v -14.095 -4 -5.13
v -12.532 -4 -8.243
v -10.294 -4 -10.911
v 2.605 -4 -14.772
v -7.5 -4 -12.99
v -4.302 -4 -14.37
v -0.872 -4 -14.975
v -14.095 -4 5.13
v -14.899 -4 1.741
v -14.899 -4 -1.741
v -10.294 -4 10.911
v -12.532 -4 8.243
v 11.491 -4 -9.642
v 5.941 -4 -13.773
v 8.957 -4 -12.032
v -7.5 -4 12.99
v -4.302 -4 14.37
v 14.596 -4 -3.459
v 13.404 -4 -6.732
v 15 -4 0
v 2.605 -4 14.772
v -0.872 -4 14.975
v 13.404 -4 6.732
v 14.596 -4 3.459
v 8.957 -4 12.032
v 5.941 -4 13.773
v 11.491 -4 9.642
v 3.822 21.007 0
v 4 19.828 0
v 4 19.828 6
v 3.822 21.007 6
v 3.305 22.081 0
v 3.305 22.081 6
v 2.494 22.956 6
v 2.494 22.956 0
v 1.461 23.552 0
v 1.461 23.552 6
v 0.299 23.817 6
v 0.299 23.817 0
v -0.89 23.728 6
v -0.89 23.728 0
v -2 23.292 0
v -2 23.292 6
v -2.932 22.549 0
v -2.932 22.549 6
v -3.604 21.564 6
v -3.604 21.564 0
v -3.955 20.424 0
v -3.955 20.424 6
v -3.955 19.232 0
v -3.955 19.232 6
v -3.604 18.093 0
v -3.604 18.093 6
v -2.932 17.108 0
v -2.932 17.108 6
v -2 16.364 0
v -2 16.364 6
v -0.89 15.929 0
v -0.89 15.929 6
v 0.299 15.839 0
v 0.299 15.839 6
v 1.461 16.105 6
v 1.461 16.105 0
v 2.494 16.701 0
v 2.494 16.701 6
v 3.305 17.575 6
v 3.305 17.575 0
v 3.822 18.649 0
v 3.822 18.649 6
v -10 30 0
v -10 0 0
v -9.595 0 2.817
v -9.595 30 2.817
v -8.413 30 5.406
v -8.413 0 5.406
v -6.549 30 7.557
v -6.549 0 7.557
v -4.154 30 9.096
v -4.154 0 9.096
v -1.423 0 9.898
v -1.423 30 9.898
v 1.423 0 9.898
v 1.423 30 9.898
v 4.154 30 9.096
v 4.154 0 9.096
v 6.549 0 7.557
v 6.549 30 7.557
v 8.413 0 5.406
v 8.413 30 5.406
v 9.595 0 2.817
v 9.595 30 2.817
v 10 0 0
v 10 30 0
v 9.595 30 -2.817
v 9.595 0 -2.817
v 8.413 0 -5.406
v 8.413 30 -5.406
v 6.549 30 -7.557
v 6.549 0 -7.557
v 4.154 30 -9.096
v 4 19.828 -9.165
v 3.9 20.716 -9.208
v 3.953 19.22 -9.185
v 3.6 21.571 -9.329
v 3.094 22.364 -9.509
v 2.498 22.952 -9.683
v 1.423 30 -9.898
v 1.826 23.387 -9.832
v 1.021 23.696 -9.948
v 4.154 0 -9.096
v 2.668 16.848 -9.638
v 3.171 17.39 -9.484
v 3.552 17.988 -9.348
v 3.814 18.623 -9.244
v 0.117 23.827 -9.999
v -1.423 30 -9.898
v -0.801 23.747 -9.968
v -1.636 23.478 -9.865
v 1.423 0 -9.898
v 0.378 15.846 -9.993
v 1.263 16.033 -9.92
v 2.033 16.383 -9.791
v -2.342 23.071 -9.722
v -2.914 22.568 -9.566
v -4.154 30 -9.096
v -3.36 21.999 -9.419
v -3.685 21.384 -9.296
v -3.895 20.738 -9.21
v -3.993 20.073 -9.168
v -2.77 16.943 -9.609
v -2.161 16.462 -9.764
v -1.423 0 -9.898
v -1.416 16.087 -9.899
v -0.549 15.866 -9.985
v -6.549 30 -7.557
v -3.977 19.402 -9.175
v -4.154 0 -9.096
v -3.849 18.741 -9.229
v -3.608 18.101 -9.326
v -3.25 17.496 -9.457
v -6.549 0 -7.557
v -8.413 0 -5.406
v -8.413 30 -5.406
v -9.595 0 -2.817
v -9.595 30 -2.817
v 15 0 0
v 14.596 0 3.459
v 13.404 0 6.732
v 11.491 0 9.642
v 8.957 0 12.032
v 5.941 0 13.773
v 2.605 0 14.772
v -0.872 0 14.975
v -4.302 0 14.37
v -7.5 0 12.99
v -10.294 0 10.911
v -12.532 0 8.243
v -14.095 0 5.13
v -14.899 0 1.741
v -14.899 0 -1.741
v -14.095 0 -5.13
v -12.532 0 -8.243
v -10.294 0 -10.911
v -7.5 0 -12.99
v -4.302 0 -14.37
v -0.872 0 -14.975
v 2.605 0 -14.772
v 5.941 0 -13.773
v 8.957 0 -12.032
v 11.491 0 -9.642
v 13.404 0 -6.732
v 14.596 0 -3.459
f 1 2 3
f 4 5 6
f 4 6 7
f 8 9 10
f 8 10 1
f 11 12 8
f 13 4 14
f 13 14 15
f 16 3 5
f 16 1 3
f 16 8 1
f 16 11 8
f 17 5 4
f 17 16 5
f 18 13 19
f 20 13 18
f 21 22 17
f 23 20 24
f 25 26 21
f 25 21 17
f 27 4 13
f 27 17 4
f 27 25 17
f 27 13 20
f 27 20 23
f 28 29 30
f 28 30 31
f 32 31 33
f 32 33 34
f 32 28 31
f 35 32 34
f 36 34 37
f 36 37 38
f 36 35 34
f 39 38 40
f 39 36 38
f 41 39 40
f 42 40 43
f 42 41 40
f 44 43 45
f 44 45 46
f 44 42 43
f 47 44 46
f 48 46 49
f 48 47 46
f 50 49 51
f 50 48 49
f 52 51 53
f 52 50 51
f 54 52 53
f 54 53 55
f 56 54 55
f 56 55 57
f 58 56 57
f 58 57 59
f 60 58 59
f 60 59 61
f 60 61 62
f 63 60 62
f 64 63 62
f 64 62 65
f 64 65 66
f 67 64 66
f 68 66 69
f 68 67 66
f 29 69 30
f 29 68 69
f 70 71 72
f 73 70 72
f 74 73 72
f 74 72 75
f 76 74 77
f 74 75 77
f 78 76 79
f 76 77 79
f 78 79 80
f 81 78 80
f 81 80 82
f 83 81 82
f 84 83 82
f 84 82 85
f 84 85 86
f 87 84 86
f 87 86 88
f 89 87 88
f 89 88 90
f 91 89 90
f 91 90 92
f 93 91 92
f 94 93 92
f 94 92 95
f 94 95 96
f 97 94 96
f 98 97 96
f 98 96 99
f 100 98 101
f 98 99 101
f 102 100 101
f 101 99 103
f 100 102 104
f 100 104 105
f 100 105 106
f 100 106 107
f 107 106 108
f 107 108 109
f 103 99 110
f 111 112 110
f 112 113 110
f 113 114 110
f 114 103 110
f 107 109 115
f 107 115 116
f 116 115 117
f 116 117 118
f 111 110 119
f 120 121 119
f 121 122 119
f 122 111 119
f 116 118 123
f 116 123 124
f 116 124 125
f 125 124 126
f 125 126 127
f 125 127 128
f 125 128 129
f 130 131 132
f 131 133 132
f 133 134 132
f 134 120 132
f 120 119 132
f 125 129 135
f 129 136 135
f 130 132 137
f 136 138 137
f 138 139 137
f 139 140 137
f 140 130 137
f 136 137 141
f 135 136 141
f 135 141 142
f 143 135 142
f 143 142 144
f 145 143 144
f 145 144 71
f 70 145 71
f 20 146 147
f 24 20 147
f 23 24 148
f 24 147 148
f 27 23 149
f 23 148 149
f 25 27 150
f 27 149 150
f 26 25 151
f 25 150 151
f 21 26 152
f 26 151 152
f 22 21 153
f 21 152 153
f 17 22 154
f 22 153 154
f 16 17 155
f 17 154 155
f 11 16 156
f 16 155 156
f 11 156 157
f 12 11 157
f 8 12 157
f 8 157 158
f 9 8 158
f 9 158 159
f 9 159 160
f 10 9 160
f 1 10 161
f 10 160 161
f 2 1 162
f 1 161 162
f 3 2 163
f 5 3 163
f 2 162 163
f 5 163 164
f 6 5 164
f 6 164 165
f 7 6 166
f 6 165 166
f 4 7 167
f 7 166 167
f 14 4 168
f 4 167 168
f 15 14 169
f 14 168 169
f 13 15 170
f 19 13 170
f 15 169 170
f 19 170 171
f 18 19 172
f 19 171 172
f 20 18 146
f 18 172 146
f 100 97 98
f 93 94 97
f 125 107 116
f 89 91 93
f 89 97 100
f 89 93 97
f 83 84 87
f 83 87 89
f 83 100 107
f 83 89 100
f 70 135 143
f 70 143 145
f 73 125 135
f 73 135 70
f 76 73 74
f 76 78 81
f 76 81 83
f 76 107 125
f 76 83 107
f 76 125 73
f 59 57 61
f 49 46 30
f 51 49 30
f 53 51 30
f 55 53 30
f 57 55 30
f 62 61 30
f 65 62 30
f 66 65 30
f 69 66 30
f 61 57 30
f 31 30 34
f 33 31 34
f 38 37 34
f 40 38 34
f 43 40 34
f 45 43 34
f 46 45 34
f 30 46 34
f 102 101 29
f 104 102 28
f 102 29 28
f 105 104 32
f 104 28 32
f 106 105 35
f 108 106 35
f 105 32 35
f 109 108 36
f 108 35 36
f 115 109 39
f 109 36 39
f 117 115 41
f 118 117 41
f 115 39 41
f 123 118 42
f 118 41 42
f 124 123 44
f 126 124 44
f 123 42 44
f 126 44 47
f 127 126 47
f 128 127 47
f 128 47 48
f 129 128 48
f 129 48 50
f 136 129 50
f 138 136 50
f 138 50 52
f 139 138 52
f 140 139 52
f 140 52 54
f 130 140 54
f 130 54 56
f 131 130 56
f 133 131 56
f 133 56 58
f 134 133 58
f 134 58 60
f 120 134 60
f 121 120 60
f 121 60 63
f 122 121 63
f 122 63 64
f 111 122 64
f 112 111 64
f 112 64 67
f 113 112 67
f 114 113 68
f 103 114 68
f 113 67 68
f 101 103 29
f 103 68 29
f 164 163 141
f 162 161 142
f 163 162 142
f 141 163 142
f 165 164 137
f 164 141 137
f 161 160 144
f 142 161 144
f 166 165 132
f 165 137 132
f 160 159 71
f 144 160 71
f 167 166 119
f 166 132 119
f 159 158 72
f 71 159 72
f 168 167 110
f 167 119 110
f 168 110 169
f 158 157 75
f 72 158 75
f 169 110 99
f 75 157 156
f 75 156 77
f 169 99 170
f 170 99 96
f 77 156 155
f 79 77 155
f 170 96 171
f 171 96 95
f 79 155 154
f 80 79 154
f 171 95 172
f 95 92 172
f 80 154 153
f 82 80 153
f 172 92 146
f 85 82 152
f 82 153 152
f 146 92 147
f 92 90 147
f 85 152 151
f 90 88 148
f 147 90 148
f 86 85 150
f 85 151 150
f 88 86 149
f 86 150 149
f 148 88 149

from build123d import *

# Parameters (mm, degrees)
F0_R     = 15
F1_DEPTH = 4
F2_R     = 10
F3_DEPTH = 30
F4_R     = 4
F5_DEPTH = 27
F6_DEPTH = 6


with BuildPart() as f1:
    # F0 (on Front) → F1 (new body)
    with BuildSketch(Plane.XZ):
        Circle(F0_R)
    extrude(amount=F1_DEPTH)

    # F2 (on face) → F3 (join)
    with BuildSketch(Plane(origin=(0, 0, 0), x_dir=(-1, 0, 0), z_dir=(0, 1, 0))):
        Circle(F2_R)
    extrude(amount=F3_DEPTH)

    # F4 (on Top) → F5 (cut)
    with BuildSketch(Plane.XY):
        with Locations((0, 19.828215)):
            Circle(F4_R)
    extrude(amount=-F5_DEPTH, mode=Mode.SUBTRACT)

    # F4 (on Top) → F6 (cut)
    with BuildSketch(Plane.XY):
        with Locations((0, 19.828215)):
            Circle(F4_R)
    extrude(amount=F6_DEPTH, mode=Mode.SUBTRACT)


solid = f1.part
